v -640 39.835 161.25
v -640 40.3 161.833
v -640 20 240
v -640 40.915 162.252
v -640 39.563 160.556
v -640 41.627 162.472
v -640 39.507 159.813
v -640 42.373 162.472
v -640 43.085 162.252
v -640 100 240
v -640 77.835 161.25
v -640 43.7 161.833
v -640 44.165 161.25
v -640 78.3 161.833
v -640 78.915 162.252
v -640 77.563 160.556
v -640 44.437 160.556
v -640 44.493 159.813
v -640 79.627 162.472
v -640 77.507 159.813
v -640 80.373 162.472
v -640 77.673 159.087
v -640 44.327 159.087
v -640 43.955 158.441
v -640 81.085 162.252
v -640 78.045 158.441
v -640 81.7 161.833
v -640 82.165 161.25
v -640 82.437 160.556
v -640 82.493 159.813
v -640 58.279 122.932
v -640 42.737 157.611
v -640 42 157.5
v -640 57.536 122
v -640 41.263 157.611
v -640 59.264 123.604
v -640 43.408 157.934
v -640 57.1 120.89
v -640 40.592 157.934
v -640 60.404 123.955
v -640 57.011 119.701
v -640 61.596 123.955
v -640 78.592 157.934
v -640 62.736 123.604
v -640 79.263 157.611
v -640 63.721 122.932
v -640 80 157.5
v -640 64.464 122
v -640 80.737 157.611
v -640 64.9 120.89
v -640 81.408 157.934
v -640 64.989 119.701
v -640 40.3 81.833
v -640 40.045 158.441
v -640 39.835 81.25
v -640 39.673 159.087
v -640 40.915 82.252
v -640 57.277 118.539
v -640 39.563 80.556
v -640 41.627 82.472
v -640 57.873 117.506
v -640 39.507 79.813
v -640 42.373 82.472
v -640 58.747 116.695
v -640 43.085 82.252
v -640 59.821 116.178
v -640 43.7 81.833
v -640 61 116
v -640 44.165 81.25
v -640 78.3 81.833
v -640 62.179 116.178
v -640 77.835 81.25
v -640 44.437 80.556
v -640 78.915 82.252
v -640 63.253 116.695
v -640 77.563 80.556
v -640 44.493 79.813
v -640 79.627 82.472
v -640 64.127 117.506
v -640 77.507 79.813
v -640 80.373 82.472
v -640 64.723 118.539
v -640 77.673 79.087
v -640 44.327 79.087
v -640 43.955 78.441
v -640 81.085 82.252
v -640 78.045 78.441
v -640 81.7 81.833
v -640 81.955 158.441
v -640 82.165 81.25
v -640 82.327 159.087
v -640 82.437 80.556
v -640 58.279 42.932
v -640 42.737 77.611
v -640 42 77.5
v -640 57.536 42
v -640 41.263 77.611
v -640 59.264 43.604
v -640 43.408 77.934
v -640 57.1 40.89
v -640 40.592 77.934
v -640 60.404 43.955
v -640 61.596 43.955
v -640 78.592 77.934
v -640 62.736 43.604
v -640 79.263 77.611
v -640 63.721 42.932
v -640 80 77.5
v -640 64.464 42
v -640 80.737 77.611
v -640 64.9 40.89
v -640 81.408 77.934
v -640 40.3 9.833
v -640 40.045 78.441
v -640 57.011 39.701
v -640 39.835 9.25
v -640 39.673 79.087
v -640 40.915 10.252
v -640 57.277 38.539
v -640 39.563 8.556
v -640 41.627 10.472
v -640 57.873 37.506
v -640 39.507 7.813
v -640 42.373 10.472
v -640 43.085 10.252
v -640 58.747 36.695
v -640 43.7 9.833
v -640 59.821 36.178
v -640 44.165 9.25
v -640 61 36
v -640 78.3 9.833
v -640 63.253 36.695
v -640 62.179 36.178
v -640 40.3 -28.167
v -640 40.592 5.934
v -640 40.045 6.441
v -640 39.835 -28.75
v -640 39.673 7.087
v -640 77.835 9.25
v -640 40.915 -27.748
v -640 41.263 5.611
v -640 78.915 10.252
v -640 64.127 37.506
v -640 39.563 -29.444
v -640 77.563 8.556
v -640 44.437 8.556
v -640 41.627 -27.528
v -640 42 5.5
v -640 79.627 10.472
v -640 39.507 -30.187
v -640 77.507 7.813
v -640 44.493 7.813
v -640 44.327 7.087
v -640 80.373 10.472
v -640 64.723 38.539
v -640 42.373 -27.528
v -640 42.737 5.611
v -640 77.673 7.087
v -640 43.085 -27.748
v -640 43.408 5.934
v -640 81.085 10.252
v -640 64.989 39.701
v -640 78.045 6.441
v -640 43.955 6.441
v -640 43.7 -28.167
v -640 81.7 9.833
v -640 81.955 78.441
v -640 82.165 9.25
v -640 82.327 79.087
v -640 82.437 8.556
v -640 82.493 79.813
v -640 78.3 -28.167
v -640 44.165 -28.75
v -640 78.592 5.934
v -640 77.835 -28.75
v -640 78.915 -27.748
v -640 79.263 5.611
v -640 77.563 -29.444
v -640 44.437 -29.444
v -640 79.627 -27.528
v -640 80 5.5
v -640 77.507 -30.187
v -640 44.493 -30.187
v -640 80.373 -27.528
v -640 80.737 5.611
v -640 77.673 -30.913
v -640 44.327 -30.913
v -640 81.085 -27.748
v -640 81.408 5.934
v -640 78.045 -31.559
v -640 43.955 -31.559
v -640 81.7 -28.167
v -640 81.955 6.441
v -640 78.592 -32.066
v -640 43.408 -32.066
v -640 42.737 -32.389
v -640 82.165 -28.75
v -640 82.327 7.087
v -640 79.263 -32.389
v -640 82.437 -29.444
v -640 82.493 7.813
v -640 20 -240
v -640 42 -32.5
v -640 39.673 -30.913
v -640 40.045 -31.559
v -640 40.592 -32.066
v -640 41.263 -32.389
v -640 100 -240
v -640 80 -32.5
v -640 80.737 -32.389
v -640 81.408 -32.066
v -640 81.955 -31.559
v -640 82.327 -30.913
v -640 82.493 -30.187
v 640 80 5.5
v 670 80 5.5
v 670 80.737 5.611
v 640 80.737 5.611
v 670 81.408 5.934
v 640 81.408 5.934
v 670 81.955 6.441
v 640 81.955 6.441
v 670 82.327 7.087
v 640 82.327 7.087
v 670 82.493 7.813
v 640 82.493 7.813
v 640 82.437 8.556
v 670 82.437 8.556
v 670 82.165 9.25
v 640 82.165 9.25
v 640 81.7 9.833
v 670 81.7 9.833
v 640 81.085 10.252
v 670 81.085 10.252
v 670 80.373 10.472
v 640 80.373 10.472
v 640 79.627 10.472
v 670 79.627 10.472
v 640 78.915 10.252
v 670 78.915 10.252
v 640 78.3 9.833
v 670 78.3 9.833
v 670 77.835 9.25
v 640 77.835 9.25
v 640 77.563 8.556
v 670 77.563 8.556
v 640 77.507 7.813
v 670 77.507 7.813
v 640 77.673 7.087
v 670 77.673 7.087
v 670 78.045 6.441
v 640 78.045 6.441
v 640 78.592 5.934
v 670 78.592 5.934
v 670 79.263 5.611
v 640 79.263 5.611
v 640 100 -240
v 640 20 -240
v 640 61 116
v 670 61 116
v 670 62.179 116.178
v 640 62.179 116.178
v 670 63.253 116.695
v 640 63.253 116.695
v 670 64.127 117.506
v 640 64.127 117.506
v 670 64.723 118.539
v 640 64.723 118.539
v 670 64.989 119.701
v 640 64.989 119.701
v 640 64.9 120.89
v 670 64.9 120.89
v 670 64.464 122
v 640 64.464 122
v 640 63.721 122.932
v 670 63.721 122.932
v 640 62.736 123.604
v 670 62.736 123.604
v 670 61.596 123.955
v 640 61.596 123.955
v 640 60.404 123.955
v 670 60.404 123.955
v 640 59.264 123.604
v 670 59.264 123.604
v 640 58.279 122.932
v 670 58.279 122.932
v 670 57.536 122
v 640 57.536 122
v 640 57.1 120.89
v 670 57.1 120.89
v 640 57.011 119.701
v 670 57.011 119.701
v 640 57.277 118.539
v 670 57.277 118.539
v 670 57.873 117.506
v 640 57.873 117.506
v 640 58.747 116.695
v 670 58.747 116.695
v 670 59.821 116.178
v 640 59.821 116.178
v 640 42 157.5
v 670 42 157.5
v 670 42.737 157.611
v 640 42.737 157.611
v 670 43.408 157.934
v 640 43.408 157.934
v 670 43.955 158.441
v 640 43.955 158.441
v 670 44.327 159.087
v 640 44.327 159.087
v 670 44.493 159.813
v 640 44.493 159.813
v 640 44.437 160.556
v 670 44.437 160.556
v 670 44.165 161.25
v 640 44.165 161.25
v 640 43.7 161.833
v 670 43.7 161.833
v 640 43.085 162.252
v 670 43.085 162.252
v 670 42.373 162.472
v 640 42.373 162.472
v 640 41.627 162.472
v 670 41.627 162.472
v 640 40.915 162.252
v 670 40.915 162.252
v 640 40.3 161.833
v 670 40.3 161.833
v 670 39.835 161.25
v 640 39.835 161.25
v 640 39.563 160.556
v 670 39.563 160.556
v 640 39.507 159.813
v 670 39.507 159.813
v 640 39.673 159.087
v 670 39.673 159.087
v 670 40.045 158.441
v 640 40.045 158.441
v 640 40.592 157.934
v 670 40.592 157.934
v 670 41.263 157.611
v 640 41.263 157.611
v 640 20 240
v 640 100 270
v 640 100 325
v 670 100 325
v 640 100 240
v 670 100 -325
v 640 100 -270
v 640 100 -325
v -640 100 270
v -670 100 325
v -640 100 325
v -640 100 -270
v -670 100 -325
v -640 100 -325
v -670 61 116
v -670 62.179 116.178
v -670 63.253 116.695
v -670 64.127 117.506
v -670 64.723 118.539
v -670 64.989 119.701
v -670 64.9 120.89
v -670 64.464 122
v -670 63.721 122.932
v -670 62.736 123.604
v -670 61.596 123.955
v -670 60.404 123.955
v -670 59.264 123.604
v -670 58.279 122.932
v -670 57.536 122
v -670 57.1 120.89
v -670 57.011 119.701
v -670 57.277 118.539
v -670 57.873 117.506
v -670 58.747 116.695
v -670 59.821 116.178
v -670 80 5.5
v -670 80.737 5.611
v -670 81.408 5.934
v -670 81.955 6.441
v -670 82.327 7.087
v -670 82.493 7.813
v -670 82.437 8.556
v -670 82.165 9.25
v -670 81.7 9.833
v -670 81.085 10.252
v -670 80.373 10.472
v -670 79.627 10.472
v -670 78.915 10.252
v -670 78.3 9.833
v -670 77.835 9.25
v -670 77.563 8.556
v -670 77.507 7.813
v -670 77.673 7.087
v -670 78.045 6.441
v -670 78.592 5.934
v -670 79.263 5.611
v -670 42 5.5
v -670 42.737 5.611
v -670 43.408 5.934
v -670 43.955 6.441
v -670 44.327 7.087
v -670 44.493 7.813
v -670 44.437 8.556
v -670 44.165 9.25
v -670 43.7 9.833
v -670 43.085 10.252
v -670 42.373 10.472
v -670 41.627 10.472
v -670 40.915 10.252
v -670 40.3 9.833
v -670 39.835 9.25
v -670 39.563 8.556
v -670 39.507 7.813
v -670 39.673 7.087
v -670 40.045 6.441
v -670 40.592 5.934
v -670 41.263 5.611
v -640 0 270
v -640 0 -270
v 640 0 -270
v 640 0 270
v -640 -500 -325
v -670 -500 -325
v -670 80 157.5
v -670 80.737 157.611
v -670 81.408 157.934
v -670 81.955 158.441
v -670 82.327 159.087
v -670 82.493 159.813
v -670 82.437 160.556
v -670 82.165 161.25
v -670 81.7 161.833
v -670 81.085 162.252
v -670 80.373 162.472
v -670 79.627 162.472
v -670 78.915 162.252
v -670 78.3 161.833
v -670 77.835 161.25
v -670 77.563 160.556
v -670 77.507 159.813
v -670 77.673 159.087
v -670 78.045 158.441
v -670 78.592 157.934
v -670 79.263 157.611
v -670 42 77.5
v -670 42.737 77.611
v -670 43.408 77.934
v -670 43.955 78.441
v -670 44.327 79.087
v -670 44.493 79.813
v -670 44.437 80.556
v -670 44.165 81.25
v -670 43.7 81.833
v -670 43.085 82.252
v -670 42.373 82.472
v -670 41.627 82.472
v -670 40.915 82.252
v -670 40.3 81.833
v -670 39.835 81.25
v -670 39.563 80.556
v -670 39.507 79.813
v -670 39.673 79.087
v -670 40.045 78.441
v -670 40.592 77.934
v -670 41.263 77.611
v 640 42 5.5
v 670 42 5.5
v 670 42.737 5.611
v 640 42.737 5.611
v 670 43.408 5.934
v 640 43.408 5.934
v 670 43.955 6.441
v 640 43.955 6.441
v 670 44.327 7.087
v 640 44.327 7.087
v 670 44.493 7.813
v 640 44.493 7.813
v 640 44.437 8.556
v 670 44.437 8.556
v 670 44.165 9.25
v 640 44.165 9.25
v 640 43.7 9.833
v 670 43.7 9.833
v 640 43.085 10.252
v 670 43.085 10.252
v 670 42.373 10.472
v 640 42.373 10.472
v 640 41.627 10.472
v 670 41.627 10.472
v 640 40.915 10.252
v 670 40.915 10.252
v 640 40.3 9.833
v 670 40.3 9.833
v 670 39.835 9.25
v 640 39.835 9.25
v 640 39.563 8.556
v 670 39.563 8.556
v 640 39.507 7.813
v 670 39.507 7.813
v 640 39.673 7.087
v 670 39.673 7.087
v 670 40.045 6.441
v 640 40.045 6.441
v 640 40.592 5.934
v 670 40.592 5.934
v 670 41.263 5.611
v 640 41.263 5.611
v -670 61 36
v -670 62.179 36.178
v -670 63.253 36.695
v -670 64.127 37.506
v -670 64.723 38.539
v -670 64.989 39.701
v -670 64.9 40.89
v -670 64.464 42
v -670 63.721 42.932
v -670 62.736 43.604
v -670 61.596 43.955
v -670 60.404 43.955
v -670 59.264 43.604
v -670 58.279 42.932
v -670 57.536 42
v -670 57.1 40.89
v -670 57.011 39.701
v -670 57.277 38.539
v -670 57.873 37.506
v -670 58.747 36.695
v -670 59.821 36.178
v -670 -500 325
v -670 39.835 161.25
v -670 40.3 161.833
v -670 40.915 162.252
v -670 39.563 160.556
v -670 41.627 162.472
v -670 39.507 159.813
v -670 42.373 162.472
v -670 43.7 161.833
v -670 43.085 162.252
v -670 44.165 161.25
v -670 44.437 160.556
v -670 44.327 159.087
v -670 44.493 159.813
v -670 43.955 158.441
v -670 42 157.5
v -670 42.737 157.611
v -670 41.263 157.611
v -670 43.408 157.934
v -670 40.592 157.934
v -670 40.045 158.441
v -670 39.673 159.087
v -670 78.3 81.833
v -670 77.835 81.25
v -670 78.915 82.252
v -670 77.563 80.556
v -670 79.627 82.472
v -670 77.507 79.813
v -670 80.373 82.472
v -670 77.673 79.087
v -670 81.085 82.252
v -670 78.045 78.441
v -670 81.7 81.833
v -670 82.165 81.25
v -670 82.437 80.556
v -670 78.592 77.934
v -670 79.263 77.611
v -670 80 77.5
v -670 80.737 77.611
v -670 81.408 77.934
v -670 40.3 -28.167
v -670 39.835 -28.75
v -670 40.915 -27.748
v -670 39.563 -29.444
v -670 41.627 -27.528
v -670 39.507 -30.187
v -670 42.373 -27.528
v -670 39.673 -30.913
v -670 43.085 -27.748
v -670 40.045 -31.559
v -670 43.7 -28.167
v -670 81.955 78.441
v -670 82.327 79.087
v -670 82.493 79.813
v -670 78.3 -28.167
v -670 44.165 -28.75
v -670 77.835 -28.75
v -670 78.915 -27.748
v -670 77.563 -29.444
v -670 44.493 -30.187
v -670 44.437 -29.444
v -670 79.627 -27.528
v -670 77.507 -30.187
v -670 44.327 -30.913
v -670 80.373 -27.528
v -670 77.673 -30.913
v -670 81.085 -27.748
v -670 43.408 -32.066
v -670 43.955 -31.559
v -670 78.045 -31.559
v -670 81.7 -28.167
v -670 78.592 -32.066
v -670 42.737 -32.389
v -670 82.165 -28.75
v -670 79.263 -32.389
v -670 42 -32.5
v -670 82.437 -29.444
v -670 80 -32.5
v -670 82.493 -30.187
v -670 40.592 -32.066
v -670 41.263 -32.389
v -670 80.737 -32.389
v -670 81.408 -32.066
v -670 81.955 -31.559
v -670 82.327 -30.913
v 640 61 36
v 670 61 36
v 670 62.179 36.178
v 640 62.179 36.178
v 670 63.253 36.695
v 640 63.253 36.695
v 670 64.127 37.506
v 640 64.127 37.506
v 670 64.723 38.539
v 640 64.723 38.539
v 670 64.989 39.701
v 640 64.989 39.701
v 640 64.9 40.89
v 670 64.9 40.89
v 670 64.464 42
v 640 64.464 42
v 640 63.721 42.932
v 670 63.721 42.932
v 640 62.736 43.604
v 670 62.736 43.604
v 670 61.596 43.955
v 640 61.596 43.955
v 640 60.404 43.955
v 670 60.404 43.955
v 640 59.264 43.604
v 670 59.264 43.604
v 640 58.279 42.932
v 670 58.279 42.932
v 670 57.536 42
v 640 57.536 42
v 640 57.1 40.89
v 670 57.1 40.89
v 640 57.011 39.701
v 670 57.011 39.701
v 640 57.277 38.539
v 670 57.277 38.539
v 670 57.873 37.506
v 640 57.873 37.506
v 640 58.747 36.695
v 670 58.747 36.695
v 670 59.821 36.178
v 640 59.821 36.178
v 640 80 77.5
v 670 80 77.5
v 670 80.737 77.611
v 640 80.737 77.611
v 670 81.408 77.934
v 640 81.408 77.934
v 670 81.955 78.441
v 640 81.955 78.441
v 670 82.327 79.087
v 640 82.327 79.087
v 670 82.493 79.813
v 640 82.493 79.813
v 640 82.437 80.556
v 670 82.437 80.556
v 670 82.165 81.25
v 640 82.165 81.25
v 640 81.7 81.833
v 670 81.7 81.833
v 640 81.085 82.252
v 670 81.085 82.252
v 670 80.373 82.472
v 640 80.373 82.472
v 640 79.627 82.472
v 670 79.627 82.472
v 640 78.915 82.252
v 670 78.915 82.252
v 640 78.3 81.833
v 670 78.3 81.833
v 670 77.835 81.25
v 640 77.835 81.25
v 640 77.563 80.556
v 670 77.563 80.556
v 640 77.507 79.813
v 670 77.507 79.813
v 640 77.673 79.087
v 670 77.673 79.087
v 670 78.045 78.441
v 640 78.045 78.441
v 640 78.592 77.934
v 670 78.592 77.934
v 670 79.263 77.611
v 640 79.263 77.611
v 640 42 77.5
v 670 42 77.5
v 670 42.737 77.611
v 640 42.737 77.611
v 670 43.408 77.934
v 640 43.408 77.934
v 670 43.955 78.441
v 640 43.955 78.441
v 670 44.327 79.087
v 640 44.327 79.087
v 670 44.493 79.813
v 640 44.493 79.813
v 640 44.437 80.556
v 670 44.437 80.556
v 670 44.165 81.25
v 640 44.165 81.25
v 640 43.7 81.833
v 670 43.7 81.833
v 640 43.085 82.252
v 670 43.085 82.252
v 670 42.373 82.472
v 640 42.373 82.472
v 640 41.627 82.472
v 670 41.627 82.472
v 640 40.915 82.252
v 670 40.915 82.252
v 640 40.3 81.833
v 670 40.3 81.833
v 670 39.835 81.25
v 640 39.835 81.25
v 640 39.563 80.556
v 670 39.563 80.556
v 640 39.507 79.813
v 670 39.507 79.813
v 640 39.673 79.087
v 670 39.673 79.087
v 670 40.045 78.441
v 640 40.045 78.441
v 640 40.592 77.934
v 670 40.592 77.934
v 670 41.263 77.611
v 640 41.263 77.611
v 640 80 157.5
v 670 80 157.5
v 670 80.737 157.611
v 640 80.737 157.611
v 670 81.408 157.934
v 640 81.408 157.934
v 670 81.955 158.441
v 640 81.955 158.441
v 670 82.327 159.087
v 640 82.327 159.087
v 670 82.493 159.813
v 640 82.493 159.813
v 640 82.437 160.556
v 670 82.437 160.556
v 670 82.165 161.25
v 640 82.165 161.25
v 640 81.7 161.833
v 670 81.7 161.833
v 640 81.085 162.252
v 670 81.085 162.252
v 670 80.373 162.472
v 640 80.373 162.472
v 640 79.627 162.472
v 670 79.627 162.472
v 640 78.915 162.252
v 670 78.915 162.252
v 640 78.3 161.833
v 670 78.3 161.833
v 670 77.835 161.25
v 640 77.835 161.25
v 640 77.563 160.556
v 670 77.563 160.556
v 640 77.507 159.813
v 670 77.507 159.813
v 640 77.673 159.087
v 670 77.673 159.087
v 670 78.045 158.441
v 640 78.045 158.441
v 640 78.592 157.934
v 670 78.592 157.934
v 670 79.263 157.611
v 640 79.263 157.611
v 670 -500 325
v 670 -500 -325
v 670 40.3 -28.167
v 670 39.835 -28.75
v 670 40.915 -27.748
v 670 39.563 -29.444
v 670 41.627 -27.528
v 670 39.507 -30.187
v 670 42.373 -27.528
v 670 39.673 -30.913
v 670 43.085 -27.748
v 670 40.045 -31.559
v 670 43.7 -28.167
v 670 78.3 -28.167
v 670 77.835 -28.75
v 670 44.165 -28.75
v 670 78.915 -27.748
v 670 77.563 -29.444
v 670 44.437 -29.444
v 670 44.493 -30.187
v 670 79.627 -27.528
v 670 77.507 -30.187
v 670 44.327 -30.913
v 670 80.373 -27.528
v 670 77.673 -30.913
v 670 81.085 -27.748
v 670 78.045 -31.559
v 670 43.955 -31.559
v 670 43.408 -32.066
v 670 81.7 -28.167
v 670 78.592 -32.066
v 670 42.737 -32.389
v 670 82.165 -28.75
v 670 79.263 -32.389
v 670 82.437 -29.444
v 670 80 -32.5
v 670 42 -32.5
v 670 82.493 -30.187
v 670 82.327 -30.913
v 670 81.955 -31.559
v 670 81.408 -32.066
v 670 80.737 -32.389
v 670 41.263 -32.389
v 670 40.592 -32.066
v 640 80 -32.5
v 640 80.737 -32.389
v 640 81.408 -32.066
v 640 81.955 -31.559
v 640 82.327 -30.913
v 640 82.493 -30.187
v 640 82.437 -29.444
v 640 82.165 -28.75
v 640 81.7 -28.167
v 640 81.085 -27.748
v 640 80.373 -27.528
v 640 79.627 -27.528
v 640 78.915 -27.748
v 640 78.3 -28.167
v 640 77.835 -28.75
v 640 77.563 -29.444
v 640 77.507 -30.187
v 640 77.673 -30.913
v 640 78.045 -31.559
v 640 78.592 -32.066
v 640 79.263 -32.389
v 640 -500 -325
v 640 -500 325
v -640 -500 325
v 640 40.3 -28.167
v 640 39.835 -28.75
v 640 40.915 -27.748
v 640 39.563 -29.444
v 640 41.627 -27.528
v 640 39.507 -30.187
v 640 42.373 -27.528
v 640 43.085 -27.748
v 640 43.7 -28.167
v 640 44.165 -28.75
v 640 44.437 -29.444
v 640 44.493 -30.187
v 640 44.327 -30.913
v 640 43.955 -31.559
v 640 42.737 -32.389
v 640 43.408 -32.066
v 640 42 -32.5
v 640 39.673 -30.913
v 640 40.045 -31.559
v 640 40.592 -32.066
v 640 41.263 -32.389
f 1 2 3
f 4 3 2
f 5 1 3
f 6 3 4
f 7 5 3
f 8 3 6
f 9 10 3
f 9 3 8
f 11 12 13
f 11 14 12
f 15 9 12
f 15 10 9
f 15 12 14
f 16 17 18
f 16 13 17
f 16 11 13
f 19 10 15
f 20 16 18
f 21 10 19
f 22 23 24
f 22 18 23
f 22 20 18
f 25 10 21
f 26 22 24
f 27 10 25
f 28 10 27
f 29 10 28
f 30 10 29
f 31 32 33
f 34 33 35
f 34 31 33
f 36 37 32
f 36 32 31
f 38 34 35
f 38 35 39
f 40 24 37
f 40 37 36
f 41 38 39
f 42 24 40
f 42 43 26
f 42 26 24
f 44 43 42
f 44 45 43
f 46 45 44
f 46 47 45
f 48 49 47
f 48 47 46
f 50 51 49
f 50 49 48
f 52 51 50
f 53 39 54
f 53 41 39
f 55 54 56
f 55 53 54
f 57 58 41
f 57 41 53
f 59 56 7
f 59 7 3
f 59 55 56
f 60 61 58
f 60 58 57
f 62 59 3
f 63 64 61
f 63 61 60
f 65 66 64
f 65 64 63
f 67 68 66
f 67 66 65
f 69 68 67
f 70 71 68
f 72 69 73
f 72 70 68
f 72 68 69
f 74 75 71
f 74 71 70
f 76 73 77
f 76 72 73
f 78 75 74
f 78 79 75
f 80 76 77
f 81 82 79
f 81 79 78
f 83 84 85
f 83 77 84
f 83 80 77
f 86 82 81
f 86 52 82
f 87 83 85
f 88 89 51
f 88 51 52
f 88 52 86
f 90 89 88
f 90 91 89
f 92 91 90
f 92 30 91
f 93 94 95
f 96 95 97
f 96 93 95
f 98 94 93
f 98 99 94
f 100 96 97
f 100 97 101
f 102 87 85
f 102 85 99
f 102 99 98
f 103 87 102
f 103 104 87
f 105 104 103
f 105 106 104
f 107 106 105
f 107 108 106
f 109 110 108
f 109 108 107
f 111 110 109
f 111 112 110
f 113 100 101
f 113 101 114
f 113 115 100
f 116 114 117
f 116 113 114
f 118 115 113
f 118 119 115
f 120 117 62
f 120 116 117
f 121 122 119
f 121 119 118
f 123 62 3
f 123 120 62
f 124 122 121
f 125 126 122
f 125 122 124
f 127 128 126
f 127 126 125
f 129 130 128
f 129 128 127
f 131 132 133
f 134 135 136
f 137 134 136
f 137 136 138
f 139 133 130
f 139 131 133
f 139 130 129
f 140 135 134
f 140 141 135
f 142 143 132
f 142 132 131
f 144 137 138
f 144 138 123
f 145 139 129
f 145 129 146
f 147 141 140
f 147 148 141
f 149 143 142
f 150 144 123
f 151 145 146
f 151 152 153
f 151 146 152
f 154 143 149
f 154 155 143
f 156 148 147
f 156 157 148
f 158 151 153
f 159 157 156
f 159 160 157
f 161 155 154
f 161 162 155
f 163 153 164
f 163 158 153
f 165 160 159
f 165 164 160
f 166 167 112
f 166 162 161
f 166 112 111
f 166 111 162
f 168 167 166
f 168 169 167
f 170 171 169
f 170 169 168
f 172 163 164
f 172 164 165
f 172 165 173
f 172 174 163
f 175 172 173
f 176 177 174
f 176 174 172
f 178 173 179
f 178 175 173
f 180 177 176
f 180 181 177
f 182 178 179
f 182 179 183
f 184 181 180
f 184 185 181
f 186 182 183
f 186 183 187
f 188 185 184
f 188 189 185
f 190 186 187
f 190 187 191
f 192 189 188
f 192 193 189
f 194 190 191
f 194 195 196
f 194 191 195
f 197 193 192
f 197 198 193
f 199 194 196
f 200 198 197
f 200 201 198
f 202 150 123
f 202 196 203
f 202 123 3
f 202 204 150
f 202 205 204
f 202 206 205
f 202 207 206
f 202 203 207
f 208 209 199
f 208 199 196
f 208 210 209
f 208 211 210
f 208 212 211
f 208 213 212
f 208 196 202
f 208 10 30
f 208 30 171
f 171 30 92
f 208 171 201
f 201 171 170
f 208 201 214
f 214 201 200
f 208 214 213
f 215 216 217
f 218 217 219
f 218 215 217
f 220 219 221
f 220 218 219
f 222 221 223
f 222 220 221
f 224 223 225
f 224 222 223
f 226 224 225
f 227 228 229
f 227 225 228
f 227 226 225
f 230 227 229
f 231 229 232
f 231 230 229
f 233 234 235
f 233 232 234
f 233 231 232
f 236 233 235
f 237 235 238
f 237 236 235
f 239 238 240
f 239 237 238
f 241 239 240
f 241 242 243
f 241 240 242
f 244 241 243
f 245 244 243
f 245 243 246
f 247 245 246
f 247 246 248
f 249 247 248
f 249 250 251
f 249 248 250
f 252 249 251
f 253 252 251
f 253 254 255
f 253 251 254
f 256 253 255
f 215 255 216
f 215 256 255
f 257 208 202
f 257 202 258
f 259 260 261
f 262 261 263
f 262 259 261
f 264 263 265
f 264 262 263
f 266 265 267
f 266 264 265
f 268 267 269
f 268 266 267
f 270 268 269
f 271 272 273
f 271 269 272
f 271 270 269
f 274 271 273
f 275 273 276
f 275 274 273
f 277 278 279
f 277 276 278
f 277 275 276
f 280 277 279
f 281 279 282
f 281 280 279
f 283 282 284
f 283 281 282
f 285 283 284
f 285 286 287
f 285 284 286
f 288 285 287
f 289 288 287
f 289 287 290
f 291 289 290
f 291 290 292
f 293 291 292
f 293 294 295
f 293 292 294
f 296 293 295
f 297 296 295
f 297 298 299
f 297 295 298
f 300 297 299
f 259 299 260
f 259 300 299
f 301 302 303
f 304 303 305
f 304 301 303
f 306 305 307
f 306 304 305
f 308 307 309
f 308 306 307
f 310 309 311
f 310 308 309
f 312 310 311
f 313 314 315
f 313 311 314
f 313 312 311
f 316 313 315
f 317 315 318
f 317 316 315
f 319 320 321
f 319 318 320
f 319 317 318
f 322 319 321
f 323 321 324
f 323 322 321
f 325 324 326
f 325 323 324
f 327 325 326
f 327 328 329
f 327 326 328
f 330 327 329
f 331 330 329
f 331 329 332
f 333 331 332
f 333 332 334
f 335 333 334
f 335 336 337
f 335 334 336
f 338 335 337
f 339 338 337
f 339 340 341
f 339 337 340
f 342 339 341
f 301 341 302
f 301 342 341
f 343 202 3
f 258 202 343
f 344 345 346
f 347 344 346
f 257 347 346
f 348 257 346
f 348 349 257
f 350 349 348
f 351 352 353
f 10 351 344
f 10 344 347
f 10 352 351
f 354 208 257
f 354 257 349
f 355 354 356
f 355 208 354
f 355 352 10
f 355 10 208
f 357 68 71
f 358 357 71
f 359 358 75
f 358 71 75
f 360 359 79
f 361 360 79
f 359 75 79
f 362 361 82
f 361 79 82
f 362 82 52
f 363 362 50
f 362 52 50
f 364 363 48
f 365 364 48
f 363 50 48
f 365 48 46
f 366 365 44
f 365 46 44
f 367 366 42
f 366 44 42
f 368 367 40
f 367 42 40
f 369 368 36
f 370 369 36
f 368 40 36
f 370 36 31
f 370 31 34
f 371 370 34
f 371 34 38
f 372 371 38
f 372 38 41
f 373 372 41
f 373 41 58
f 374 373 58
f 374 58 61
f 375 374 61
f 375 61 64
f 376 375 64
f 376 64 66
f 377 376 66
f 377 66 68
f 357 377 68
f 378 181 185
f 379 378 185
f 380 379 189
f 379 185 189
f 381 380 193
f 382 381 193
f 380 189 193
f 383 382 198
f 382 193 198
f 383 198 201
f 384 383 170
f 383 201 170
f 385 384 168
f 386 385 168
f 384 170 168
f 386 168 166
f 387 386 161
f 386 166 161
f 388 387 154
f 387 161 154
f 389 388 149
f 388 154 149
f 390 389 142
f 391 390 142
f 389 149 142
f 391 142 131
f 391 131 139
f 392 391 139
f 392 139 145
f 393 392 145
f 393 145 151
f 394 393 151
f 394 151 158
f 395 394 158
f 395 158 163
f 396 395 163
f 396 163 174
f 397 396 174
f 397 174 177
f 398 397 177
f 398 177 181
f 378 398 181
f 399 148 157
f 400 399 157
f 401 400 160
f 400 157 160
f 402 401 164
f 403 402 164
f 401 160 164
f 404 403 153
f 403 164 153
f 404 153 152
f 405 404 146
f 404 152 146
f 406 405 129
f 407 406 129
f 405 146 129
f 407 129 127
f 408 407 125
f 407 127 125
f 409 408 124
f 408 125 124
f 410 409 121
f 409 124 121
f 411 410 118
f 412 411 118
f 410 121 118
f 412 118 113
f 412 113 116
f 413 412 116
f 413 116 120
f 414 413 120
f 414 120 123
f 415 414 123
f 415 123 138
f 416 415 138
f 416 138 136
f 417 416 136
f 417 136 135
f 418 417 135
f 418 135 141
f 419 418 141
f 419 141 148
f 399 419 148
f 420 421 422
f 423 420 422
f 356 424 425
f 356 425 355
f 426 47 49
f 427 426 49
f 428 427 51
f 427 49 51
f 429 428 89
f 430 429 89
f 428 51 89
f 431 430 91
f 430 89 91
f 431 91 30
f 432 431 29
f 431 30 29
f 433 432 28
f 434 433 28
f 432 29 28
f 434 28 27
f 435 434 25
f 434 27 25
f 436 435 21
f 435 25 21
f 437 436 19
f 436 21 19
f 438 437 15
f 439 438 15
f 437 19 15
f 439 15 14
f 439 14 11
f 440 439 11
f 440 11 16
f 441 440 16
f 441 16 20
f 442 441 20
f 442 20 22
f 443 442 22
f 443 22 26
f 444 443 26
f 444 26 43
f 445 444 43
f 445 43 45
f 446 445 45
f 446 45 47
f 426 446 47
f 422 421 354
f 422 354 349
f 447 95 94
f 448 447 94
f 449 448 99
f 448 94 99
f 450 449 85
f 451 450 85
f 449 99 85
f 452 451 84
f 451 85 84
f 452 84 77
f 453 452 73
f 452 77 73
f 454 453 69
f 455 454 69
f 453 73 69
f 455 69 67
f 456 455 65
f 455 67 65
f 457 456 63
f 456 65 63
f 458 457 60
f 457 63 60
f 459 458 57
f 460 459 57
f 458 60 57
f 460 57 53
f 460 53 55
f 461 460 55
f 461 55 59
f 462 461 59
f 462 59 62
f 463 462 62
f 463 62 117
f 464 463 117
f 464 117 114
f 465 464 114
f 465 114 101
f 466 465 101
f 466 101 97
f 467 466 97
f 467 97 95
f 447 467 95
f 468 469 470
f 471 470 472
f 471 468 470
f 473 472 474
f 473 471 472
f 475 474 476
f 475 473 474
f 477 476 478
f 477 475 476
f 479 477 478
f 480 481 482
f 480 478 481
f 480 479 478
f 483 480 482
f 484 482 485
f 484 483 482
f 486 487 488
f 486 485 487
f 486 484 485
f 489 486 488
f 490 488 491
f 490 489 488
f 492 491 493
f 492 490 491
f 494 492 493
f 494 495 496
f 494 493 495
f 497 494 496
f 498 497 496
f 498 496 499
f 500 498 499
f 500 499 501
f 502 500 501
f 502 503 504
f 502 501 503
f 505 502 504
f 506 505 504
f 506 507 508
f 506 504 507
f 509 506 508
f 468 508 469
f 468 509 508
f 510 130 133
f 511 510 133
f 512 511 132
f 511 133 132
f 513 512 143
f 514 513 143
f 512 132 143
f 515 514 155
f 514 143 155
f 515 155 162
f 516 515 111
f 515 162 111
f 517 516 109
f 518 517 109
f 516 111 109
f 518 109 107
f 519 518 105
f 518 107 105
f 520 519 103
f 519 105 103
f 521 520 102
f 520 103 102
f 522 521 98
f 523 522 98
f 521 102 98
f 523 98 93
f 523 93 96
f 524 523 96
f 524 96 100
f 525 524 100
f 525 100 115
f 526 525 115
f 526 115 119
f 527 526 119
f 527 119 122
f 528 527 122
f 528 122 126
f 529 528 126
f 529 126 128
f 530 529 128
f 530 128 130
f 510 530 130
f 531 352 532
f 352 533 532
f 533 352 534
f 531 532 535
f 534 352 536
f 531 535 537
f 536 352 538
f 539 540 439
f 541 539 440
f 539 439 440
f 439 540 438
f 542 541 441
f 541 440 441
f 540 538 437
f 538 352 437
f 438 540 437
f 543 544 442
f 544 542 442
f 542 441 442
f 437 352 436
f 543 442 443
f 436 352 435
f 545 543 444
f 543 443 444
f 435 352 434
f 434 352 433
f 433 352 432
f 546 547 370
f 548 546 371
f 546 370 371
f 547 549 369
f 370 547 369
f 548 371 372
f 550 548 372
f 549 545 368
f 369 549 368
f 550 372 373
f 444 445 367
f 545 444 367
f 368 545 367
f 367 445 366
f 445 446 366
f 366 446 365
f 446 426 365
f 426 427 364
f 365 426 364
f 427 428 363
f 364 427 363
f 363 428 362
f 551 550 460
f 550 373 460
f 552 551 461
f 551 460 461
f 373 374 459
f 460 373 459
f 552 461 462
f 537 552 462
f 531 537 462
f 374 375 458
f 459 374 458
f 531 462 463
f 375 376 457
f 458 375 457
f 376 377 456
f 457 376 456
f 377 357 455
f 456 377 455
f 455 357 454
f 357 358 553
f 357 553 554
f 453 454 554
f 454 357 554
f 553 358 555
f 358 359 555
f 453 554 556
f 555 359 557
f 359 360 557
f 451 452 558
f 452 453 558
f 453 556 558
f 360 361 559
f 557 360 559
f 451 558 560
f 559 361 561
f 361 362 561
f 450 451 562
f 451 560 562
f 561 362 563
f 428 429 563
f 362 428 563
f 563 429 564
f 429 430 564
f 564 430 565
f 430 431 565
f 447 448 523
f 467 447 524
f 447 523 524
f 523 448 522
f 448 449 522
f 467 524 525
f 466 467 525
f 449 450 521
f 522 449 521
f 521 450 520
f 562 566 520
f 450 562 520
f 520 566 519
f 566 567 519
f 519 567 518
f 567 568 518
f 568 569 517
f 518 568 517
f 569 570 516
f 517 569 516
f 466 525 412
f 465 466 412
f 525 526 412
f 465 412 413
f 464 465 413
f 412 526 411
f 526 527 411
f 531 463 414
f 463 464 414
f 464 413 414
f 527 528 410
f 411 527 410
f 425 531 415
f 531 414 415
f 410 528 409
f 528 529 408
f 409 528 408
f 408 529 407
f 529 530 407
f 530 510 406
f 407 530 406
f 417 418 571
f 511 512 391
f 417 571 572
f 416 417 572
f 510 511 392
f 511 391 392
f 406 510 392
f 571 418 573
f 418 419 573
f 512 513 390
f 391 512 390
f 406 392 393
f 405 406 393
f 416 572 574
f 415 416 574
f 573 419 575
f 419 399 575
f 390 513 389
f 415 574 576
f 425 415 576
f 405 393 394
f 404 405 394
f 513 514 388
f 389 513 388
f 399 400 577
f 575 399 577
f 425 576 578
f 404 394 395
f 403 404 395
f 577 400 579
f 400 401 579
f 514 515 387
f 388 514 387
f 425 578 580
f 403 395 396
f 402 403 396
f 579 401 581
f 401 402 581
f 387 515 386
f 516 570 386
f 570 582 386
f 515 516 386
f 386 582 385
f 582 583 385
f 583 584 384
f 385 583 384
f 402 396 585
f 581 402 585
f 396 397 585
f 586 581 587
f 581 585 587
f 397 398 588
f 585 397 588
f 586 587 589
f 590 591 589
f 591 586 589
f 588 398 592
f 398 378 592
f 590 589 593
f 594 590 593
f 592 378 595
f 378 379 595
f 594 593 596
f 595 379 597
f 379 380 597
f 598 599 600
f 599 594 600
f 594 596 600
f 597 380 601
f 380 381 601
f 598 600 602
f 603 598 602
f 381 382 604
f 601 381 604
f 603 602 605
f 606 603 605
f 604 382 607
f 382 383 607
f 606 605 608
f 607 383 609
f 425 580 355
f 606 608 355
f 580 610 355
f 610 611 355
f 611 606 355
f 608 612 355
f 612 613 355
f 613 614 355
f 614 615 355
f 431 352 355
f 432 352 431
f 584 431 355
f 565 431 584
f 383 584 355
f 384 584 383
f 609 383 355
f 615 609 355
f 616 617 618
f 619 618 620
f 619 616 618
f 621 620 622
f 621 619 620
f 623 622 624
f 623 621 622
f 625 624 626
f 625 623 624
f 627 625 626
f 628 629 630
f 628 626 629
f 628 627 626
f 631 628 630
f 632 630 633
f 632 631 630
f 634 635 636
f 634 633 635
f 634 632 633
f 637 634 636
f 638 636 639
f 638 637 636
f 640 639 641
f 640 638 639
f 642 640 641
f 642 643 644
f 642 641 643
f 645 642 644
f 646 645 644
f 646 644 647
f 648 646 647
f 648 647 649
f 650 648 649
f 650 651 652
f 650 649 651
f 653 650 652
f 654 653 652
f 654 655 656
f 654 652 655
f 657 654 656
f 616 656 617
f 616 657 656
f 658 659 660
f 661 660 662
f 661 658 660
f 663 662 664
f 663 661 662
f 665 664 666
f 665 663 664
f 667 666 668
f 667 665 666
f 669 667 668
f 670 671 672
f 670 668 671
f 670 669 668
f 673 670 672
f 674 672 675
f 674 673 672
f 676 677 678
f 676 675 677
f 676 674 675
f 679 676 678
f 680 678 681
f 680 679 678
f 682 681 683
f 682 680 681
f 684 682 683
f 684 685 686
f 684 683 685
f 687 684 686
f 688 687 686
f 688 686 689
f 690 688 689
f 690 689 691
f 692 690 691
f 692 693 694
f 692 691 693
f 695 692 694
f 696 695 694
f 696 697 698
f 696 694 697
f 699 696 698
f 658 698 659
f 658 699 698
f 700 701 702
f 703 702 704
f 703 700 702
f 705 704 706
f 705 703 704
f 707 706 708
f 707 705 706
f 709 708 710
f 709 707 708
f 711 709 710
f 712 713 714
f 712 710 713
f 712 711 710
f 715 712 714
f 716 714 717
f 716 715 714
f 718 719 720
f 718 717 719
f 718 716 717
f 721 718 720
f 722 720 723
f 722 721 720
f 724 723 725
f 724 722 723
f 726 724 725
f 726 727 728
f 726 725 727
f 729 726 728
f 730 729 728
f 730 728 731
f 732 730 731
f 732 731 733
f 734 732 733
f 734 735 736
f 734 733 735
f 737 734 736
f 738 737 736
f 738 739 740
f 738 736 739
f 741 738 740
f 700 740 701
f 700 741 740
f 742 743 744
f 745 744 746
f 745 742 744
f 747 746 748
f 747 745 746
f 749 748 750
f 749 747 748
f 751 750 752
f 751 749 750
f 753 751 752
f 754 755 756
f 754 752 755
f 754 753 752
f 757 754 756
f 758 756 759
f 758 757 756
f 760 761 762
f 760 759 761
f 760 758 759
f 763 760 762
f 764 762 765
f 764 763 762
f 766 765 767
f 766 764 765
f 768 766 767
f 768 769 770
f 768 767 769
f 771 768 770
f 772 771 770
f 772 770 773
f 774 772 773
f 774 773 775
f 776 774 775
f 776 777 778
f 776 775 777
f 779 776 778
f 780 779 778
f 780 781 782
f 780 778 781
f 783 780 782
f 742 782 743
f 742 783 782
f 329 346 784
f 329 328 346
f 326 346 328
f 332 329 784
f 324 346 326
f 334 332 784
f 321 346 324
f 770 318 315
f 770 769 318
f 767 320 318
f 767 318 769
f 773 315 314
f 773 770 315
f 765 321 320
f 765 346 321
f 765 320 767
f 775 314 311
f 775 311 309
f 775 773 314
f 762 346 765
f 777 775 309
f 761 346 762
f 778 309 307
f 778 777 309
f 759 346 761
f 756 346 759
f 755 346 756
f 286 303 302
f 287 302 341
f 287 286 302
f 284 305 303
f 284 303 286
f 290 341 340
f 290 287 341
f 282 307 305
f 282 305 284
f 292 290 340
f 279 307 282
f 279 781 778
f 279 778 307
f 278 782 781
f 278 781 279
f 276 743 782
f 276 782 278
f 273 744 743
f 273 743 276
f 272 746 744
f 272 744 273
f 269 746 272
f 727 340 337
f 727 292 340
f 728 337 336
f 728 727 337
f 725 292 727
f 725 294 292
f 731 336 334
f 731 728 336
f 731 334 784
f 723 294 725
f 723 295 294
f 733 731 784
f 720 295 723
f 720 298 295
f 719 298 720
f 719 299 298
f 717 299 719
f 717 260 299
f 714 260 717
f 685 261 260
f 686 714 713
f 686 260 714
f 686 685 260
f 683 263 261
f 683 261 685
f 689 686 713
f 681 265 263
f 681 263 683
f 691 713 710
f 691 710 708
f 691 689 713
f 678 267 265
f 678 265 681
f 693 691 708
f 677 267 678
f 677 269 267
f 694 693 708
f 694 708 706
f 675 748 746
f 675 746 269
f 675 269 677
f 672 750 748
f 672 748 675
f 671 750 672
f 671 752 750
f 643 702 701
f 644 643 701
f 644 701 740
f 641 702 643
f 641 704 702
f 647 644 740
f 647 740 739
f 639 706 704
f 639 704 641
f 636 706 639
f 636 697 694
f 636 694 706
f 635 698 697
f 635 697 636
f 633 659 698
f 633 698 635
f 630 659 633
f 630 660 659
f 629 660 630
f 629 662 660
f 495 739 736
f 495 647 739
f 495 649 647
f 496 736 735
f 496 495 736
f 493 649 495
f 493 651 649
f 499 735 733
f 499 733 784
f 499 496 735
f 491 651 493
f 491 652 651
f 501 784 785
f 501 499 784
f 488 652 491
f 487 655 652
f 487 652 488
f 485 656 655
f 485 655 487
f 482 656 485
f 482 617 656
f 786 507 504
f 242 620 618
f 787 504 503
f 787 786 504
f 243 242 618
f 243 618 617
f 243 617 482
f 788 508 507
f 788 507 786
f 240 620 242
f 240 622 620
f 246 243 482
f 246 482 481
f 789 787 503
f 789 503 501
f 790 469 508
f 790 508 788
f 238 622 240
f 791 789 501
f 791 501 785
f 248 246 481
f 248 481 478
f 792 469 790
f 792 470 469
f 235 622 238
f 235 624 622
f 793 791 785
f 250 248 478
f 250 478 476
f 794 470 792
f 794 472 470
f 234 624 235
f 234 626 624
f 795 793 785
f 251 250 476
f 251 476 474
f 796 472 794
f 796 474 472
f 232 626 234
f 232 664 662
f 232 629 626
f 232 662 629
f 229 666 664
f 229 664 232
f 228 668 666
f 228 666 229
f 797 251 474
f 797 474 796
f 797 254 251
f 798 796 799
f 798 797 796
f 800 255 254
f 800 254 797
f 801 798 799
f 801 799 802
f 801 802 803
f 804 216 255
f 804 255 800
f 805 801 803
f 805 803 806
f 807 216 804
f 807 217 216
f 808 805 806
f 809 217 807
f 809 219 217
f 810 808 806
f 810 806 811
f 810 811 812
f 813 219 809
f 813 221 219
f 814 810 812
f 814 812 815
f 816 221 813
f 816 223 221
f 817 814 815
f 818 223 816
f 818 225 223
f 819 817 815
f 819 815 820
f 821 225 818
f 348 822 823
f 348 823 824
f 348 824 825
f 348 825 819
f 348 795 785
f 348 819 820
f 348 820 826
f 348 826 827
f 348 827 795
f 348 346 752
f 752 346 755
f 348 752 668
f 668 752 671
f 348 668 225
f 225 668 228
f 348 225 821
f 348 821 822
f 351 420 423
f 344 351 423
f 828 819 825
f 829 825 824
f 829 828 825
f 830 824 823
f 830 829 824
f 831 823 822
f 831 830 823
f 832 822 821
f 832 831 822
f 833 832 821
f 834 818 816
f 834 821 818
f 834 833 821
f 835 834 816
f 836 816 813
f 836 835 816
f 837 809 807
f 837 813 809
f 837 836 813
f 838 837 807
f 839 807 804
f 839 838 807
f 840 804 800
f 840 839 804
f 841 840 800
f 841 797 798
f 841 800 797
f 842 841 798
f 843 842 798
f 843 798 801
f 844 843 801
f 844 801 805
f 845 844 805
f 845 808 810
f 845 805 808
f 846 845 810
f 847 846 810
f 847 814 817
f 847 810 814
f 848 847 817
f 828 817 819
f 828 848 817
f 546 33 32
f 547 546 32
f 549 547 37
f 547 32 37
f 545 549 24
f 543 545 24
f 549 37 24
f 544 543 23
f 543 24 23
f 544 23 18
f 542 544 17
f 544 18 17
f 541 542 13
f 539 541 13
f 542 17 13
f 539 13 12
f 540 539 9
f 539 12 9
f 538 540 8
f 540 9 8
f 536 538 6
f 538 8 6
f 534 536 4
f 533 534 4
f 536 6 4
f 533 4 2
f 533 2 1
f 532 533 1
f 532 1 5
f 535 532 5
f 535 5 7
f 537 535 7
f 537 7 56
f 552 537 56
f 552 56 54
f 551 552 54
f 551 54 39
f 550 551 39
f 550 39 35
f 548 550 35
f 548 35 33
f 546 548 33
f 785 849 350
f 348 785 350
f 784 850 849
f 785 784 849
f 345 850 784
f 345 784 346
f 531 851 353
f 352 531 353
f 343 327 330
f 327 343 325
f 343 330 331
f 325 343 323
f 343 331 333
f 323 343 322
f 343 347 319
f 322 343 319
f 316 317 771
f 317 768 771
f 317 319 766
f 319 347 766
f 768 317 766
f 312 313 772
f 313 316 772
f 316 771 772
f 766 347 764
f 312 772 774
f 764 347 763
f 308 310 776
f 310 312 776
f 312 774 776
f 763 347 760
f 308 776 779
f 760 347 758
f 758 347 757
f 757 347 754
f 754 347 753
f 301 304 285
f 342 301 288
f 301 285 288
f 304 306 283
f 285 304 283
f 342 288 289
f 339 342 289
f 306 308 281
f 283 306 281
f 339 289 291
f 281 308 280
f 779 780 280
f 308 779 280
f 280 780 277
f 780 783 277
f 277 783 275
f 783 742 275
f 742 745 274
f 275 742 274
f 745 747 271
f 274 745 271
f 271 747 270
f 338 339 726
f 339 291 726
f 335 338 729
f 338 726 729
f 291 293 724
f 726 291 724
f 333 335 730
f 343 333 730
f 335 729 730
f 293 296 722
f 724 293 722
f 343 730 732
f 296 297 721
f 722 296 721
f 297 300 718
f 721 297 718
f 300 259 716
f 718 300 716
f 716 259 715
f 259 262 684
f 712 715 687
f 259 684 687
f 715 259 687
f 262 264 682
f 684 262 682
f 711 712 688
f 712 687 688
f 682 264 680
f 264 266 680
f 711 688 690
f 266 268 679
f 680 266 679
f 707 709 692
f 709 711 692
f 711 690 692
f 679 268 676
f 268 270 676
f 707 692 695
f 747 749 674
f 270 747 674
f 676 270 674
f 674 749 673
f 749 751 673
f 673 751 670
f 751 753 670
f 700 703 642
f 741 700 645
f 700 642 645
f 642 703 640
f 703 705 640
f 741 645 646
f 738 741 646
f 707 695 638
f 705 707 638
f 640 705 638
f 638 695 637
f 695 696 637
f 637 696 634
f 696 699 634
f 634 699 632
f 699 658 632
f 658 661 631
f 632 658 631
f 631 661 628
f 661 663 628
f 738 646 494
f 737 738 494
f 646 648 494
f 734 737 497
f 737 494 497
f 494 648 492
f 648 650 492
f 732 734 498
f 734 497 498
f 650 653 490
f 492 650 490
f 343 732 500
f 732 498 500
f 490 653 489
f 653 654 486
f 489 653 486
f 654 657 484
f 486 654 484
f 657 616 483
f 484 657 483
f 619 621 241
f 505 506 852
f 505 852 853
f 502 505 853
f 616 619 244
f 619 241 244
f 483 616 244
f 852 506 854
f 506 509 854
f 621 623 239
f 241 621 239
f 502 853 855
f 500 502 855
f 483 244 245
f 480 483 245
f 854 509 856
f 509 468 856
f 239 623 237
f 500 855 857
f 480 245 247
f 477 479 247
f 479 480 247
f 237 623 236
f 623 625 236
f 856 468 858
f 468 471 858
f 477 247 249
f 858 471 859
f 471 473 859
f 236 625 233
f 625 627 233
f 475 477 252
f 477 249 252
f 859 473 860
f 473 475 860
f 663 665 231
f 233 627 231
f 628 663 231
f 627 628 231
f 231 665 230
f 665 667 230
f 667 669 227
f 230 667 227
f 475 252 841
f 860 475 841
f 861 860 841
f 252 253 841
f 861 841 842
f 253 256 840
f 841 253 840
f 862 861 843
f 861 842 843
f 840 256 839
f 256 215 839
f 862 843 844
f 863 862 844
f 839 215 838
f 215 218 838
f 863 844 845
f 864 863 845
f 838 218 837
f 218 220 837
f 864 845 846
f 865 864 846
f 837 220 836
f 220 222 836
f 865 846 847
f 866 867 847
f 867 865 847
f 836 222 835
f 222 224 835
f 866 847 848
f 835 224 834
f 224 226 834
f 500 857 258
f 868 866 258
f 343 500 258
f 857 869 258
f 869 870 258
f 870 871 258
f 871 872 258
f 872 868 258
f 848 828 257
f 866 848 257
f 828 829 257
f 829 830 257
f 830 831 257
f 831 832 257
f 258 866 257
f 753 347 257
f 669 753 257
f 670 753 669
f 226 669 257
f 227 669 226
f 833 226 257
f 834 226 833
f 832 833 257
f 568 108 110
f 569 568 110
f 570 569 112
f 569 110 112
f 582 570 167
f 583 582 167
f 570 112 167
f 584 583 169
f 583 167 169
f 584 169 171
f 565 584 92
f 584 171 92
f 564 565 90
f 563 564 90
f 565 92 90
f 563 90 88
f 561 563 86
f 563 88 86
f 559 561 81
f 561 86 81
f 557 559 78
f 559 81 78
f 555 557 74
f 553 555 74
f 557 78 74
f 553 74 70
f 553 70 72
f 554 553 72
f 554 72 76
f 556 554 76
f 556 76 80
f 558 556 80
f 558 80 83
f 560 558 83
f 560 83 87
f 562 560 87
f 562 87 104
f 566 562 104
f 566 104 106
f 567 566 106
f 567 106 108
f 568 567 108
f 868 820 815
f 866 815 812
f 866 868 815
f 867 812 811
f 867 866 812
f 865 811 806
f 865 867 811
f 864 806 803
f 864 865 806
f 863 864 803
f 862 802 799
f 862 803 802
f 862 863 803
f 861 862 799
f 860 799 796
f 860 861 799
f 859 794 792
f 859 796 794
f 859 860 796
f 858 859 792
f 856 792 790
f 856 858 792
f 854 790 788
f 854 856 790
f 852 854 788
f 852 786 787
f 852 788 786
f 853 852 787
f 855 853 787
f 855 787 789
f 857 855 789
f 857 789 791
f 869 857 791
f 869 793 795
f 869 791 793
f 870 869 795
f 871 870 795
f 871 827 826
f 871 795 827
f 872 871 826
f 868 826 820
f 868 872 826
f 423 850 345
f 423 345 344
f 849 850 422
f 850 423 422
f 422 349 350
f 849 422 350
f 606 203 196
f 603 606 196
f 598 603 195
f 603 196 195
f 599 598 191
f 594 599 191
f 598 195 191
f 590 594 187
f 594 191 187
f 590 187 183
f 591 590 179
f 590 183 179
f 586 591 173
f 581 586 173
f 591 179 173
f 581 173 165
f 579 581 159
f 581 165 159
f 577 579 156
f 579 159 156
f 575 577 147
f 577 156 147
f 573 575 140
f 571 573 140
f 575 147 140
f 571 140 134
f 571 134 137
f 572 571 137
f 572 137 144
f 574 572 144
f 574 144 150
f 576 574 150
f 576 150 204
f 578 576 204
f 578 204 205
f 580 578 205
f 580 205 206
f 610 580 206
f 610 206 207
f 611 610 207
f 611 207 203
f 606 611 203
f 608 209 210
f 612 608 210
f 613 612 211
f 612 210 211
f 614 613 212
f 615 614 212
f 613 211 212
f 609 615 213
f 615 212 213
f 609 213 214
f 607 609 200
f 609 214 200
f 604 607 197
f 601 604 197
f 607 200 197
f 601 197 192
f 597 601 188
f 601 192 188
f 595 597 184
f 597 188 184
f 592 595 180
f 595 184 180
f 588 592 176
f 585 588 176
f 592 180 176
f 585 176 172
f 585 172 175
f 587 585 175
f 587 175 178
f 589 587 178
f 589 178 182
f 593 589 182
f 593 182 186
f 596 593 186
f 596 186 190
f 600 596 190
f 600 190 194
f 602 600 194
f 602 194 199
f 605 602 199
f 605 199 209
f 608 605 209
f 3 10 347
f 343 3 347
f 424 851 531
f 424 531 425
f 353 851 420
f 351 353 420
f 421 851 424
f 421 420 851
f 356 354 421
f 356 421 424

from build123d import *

# Parameters (mm, degrees)
SKETCH1_W           = 1340
SKETCH1_H           = 540
BOSS_EXTRUDE1_DEPTH = 100
SKETCH2_W           = 1280
SKETCH2_H           = 480
CUT_EXTRUDE1_DEPTH  = 80
SKETCH6_W           = 650
SKETCH6_H           = 600
BOSS_EXTRUDE3_DEPTH = 30
SKETCH10_R          = 2.5
CUT_EXTRUDE3_DEPTH  = 80
SKETCH11_R          = 4
CUT_EXTRUDE4_DEPTH  = 80


with BuildPart() as part:
    # Sketch1 → Boss-Extrude1 (new body)
    with BuildSketch(Plane(origin=(0, 0, 0), x_dir=(1, 0, 0), z_dir=(0, 1, 0))):
        Rectangle(SKETCH1_W, SKETCH1_H)
    extrude(amount=BOSS_EXTRUDE1_DEPTH)

    # Sketch2 → Cut-Extrude1 (cut)
    with BuildSketch(Plane(origin=(0, 100, 0), x_dir=(1, 0, 0), z_dir=(0, 1, 0))):
        Rectangle(SKETCH2_W, SKETCH2_H)
    extrude(amount=-CUT_EXTRUDE1_DEPTH, mode=Mode.SUBTRACT)

    # Sketch6 → Boss-Extrude3 (add)
    with BuildSketch(Plane(origin=(-640, 0, 0), x_dir=(0, 0, -1), z_dir=(1, 0, 0))):
        with Locations((0, -200)):
            Rectangle(SKETCH6_W, SKETCH6_H)
    boss_extrude3 = extrude(amount=-BOSS_EXTRUDE3_DEPTH)

    # Mirror3: Boss-Extrude3 across plane
    add(boss_extrude3.mirror(Plane(origin=(0, 0, 0), x_dir=(0, 0, 1), z_dir=(1, 0, 0))))

    # Sketch10 → Cut-Extrude3 (cut)
    with BuildSketch(Plane(origin=(-640, 0, 0), x_dir=(0, 0, -1), z_dir=(1, 0, 0))):
        with Locations((-160, 80)):
            Circle(SKETCH10_R)
        with Locations((-160, 42)):
            Circle(SKETCH10_R)
        with Locations((-80, 42)):
            Circle(SKETCH10_R)
        with Locations((-80, 80)):
            Circle(SKETCH10_R)
        with Locations((30, 80)):
            Circle(SKETCH10_R)
        with Locations((30, 42)):
            Circle(SKETCH10_R)
        with Locations((-8, 42)):
            Circle(SKETCH10_R)
        with Locations((-8, 80)):
            Circle(SKETCH10_R)
    cut_extrude3 = extrude(amount=-CUT_EXTRUDE3_DEPTH, mode=Mode.SUBTRACT)

    # Mirror4: Cut-Extrude3 across plane
    add(cut_extrude3.mirror(Plane(origin=(0, 0, 0), x_dir=(0, 0, 1), z_dir=(1, 0, 0))), mode=Mode.SUBTRACT)

    # Sketch11 → Cut-Extrude4 (cut)
    with BuildSketch(Plane(origin=(-640, 0, 0), x_dir=(0, 0, -1), z_dir=(1, 0, 0))):
        with Locations((-40, 61)):
            Circle(SKETCH11_R)
        with Locations((-120, 61)):
            Circle(SKETCH11_R)
    cut_extrude4 = extrude(amount=-CUT_EXTRUDE4_DEPTH, mode=Mode.SUBTRACT)

    # Mirror5: Cut-Extrude4 across plane
    add(cut_extrude4.mirror(Plane(origin=(0, 0, 0), x_dir=(0, 0, 1), z_dir=(1, 0, 0))), mode=Mode.SUBTRACT)


solid = part.part
